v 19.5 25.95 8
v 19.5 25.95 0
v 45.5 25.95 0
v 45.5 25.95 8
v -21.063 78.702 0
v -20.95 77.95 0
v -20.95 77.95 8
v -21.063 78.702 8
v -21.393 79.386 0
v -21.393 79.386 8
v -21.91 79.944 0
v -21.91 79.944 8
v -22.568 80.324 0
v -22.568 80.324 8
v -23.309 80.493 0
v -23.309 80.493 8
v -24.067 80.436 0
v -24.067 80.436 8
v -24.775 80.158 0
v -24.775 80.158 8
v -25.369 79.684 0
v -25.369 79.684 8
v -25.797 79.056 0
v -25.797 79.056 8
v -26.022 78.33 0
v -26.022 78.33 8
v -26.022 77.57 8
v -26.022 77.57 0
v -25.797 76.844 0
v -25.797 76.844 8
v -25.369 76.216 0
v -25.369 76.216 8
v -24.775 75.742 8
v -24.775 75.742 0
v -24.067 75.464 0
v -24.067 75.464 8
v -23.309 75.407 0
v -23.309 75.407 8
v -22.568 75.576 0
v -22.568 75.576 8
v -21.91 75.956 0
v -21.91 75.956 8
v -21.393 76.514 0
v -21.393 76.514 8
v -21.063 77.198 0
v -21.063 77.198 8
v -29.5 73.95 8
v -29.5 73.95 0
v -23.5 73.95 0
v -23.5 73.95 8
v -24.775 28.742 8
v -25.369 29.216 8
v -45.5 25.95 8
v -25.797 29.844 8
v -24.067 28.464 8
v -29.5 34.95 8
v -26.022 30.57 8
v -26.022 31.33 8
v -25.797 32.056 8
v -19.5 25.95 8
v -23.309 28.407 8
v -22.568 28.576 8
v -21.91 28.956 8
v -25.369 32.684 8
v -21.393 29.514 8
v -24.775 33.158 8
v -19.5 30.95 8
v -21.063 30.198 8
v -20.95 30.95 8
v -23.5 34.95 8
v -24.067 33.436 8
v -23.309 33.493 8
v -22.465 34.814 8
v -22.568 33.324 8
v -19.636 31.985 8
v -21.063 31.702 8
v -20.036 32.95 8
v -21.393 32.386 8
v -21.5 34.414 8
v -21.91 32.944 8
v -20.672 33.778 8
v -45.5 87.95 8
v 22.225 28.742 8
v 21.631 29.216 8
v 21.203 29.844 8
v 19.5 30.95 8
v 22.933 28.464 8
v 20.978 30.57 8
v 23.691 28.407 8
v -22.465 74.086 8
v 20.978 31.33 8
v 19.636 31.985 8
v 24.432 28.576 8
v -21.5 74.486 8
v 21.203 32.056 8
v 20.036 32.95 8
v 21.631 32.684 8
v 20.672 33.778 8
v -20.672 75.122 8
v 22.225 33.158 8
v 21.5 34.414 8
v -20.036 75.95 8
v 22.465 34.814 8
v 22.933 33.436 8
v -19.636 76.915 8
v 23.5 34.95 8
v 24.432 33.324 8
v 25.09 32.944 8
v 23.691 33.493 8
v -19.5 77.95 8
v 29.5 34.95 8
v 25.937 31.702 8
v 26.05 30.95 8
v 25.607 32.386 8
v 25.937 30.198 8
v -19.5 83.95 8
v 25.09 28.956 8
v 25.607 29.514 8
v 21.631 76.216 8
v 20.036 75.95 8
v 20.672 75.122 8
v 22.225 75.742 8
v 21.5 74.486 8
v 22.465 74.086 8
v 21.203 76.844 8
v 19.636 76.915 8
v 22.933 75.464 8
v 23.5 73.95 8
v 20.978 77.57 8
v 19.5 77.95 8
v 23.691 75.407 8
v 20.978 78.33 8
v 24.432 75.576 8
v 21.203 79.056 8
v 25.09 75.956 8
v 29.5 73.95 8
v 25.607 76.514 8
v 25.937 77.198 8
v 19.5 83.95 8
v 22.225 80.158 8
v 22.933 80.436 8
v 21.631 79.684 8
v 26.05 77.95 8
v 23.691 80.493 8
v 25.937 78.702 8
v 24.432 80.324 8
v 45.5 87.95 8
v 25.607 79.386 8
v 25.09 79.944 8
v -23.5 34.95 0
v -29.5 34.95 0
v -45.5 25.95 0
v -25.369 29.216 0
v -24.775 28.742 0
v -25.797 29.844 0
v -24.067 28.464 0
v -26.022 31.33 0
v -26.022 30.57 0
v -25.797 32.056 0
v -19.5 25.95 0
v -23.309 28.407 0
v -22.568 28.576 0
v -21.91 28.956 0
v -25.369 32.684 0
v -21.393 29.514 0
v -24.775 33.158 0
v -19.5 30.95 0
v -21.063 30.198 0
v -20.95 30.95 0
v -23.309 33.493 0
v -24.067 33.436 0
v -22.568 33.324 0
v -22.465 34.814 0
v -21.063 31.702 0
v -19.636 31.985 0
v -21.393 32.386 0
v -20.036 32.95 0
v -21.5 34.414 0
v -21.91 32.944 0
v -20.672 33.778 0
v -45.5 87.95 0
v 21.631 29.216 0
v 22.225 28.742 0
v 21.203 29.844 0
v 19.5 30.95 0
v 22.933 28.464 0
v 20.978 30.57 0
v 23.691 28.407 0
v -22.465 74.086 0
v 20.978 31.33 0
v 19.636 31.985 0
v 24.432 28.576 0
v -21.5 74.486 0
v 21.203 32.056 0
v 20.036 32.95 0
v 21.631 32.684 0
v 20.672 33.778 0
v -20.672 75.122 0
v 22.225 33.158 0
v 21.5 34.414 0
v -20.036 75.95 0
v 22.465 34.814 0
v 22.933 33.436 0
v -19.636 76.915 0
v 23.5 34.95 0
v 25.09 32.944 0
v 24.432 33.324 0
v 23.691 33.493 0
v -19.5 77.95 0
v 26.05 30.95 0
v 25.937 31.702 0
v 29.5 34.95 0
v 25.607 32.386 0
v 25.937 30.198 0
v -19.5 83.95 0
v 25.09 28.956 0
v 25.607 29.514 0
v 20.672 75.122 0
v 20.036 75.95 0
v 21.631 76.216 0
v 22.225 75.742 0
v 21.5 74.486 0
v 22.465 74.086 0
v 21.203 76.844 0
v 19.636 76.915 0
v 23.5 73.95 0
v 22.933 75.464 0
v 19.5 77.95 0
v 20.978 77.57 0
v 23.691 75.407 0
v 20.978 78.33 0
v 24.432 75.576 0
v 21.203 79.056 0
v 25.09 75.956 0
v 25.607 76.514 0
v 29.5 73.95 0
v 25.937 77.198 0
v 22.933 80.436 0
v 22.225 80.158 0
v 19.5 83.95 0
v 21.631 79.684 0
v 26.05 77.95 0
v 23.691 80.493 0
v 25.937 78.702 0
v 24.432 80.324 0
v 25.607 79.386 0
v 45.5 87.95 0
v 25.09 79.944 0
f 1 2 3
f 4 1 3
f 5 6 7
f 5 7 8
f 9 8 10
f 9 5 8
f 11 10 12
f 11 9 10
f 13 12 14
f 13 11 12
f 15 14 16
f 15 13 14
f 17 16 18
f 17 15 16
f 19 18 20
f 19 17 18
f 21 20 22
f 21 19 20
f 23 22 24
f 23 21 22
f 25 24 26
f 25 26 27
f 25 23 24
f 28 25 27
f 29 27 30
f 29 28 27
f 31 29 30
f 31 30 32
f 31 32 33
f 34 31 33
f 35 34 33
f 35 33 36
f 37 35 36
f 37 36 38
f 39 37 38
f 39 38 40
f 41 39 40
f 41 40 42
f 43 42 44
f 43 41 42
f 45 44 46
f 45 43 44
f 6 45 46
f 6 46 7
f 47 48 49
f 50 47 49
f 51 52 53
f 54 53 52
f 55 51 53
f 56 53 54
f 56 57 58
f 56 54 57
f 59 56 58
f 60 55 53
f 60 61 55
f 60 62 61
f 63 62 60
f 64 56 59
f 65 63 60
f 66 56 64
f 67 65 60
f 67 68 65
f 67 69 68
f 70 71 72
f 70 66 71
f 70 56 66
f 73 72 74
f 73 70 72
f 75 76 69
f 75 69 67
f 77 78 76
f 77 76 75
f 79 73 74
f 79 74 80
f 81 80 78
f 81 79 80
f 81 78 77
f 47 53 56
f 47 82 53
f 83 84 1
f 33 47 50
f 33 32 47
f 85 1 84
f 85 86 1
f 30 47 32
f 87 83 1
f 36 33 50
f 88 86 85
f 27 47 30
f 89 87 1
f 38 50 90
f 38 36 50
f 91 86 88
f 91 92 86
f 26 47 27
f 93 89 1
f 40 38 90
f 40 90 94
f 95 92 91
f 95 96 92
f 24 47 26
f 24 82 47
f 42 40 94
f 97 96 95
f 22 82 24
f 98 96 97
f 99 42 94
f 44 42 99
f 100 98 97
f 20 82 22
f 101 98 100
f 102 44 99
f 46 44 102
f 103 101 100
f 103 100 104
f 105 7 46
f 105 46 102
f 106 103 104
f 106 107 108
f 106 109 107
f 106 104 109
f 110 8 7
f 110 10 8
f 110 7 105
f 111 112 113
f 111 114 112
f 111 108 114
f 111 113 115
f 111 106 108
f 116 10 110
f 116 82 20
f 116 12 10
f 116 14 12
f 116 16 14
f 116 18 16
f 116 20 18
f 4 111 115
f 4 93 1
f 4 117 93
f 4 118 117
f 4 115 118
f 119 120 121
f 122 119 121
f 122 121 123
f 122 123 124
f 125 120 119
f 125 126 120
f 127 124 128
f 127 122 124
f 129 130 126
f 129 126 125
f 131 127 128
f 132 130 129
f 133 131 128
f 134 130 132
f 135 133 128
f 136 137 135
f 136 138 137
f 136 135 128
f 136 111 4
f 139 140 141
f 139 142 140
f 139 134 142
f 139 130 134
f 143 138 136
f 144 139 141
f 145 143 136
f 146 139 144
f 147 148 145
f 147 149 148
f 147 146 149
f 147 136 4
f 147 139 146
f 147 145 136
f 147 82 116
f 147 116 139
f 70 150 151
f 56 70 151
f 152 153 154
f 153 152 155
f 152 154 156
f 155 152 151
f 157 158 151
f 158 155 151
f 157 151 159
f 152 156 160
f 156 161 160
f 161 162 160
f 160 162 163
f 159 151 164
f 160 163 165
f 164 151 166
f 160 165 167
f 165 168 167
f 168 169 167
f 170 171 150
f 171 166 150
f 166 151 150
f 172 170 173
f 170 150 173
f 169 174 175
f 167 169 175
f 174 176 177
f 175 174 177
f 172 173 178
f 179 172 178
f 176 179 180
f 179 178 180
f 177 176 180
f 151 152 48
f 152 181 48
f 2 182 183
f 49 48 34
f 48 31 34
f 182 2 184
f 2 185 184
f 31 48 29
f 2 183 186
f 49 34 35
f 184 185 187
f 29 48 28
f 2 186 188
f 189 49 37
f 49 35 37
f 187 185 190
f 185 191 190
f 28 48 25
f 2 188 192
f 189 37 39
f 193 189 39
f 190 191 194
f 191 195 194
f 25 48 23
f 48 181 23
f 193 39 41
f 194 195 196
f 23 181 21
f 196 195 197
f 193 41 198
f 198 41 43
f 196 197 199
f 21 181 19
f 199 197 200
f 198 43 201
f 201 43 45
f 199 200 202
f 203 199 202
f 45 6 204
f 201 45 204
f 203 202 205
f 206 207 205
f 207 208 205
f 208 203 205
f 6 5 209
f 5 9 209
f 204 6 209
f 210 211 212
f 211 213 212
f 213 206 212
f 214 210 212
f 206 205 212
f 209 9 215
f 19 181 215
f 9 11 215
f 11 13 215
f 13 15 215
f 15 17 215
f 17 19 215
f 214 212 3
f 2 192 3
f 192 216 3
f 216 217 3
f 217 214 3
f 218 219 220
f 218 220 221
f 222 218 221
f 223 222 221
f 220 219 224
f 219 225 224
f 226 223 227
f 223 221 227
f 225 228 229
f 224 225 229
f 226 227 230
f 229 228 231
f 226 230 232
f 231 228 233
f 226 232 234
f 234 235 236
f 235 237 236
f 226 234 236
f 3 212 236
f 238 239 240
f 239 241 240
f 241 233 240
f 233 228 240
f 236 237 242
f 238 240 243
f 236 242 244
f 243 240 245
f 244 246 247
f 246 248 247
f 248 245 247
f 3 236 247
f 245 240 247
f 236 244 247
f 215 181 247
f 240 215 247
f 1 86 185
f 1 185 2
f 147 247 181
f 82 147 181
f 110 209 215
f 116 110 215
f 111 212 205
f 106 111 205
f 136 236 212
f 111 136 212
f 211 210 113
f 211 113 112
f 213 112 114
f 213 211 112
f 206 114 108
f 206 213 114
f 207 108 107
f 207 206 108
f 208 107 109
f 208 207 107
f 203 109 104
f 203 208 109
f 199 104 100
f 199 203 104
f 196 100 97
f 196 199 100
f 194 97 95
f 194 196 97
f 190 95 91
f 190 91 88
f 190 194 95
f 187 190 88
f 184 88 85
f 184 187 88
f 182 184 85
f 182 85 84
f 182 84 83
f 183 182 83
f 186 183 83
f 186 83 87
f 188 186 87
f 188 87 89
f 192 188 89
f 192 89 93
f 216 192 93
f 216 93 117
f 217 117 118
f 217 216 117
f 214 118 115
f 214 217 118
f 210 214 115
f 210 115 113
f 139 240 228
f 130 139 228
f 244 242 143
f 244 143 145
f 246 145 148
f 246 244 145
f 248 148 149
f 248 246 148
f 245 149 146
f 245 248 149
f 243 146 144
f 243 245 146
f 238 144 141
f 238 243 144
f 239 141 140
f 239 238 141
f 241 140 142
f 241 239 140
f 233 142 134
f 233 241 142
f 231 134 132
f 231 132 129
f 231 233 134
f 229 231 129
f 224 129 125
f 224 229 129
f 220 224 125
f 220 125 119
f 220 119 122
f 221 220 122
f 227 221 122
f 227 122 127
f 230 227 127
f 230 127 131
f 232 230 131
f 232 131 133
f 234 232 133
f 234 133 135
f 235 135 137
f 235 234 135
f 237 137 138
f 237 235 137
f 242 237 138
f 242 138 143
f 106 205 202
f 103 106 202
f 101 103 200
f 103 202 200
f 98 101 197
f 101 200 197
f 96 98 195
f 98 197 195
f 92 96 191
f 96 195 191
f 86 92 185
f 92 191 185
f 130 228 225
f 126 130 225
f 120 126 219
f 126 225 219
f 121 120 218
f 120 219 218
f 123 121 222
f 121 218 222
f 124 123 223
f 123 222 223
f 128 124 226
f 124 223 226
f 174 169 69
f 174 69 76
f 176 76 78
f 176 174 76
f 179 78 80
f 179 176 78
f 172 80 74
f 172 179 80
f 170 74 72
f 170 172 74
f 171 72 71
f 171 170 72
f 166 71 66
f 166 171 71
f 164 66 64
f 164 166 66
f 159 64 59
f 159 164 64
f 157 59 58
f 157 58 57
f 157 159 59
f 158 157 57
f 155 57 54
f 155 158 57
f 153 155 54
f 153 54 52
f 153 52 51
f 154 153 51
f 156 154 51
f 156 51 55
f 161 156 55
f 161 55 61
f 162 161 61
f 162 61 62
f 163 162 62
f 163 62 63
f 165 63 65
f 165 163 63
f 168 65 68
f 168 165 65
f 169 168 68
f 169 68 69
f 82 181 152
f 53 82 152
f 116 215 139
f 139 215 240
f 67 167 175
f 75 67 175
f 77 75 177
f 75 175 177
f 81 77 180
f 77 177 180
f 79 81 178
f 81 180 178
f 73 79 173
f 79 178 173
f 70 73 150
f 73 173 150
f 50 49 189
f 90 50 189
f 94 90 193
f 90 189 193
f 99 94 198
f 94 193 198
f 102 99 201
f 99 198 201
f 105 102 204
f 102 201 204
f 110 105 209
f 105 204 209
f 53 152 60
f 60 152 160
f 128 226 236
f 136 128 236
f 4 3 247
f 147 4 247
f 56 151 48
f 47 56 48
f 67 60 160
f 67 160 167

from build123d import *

# Parameters (mm, degrees)
ESQUISSE1_R        = 2.55
BOSS_EXTRU_2_DEPTH = 8


with BuildPart() as part:
    # Esquisse1 → Boss.-Extru.2 (new body)
    with BuildSketch(Plane.XY):
        with BuildLine():
            Line((-45.5, 82.95), (-45.5, 26.95))
            Line((-45.5, 26.95), (-45.5, 25.95))
            Line((-45.5, 25.95), (-19.5, 25.95))
            Line((-19.5, 25.95), (-19.5, 30.95))
            ThreePointArc((-19.5, 30.95), (-20.671572875, 33.778427125), (-23.5, 34.95))
            Line((-23.5, 34.95), (-29.5, 34.95))
            Line((-29.5, 34.95), (-29.5, 73.95))
            Line((-29.5, 73.95), (-23.5, 73.95))
            ThreePointArc((-23.5, 73.95), (-20.671572875, 75.121572875), (-19.5, 77.95))
            Line((-19.5, 77.95), (-19.5, 82.95))
            Line((-19.5, 82.95), (-19.5, 83.95))
            Line((-19.5, 83.95), (-18.5, 83.95))
            Line((-18.5, 83.95), (18.5, 83.95))
            Line((18.5, 83.95), (19.5, 83.95))
            Line((19.5, 83.95), (19.5, 82.95))
            Line((19.5, 82.95), (19.5, 77.95))
            ThreePointArc((19.5, 77.95), (20.671572875, 75.121572875), (23.5, 73.95))
            Line((23.5, 73.95), (29.5, 73.95))
            Line((29.5, 73.95), (29.5, 34.95))
            Line((29.5, 34.95), (23.5, 34.95))
            ThreePointArc((23.5, 34.95), (20.671572875, 33.778427125), (19.5, 30.95))
            Line((19.5, 30.95), (19.5, 25.95))
            Line((19.5, 25.95), (28.5, 25.95))
            Line((28.5, 25.95), (45.5, 25.95))
            Line((45.5, 25.95), (45.5, 26.95))
            Line((45.5, 26.95), (45.5, 82.95))
            Line((45.5, 82.95), (45.5, 87.95))
            Line((45.5, 87.95), (-45.5, 87.95))
            Line((-45.5, 87.95), (-45.5, 82.95))
        make_face()
        with Locations((-23.5, 30.95)):
            Circle(ESQUISSE1_R, mode=Mode.SUBTRACT)
        with Locations((23.5, 30.95)):
            Circle(ESQUISSE1_R, mode=Mode.SUBTRACT)
        with Locations((-23.5, 77.95)):
            Circle(ESQUISSE1_R, mode=Mode.SUBTRACT)
        with Locations((23.5, 77.95)):
            Circle(ESQUISSE1_R, mode=Mode.SUBTRACT)
    extrude(amount=BOSS_EXTRU_2_DEPTH)


solid = part.part
